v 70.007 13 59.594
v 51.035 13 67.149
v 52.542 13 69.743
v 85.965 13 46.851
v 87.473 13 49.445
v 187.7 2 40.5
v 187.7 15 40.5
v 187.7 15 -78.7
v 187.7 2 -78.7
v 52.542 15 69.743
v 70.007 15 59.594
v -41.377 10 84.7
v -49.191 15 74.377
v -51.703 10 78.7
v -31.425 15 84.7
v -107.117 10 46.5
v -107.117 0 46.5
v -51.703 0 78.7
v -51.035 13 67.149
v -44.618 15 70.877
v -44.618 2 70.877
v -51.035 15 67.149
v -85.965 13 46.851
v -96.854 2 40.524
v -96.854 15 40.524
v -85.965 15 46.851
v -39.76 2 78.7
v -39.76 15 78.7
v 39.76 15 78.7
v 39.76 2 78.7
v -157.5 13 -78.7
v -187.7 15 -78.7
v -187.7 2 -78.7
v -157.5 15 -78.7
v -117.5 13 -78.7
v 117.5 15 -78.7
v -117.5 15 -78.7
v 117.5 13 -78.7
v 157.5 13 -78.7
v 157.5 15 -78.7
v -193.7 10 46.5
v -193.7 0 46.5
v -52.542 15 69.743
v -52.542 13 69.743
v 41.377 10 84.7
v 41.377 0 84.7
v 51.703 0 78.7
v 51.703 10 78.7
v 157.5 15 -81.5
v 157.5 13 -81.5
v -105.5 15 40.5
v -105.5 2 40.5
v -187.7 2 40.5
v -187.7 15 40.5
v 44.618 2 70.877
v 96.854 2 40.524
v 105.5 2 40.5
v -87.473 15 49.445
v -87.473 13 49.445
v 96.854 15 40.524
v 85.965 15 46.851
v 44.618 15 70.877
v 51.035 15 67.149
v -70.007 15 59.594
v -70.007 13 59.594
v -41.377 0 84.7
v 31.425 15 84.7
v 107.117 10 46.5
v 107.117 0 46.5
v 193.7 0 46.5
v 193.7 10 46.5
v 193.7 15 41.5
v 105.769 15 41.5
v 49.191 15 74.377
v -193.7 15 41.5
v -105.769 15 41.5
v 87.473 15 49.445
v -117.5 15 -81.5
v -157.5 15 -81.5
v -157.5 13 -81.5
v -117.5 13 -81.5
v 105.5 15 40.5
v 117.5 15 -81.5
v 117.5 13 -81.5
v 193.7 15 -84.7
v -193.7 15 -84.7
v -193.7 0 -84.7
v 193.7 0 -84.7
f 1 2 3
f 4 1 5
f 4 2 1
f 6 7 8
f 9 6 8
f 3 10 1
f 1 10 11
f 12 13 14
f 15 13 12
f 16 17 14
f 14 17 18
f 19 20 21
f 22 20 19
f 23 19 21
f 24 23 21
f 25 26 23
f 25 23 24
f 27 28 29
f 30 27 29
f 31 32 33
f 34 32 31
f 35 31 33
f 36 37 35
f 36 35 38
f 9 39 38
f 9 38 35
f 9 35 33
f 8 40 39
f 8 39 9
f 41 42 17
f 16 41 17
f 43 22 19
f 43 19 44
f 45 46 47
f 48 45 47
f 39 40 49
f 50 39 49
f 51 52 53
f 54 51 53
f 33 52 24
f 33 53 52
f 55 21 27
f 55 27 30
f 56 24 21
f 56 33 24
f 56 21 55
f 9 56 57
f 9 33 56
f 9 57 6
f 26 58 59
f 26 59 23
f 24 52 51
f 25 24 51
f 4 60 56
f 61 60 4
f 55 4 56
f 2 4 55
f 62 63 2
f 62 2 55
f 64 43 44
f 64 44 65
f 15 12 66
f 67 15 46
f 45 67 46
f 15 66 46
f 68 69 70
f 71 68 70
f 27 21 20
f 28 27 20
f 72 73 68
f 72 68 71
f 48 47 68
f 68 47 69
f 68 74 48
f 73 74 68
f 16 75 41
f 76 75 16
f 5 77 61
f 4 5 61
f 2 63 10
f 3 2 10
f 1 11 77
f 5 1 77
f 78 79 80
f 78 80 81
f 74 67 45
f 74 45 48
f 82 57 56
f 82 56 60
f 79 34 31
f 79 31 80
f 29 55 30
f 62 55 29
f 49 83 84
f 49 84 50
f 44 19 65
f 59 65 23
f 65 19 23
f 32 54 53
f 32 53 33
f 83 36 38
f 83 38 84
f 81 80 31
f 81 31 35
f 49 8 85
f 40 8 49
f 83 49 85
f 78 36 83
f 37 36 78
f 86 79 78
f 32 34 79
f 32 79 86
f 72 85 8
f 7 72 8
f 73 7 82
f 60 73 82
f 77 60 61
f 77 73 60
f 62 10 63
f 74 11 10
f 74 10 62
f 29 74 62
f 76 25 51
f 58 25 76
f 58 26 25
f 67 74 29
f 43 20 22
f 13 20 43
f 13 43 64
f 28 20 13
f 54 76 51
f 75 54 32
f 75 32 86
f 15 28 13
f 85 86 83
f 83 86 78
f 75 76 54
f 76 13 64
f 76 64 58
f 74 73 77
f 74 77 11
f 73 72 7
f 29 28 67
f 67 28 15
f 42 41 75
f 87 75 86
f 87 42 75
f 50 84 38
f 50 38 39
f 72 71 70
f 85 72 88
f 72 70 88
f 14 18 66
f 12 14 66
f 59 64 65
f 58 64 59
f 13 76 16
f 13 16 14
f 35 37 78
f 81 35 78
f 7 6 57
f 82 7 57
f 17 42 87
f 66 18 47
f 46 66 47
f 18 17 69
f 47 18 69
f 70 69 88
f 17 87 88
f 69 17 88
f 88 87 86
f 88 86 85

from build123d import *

# Parameters (mm, degrees)
SKETCH1_W           = 387.4
SKETCH1_H           = 169.4
BOSS_EXTRUDE1_DEPTH = 15
SKETCH2_W           = 375.4
SKETCH2_H           = 157.4
CUT_EXTRUDE1_DEPTH  = 13
SKETCH3_W           = 40
SKETCH3_H           = 2.8
CUT_EXTRUDE2_DEPTH  = 2
BOSS_EXTRUDE2_DEPTH = 13
CUT_EXTRUDE3_DEPTH  = 212.940510521
CHAMFER1_SIZE       = 5
SKETCH7_W           = 76.032406234
SKETCH7_H           = 13
BOSS_EXTRUDE3_DEPTH = 4.323125
CHAMFER3_SIZE2      = 8.130615601
CHAMFER3_SIZE       = 4.323125
CHAMFER4_SIZE2      = 4.323125
CHAMFER4_SIZE       = 7.487872147
SKETCH8_W           = 76.032406234
SKETCH8_H           = 13
BOSS_EXTRUDE4_DEPTH = 4.323125
CHAMFER5_SIZE2      = 8.130615601
CHAMFER5_SIZE       = 4.323125
CHAMFER6_SIZE2      = 4.323125
CHAMFER6_SIZE       = 7.487872147
CUT_EXTRUDE4_DEPTH  = 2


with BuildPart() as part:
    # Sketch1 → Boss-Extrude1 (new body)
    with BuildSketch(Plane(origin=(0, 0, 0), x_dir=(1, 0, 0), z_dir=(0, 1, 0))):
        Rectangle(SKETCH1_W, SKETCH1_H)
    extrude(amount=BOSS_EXTRUDE1_DEPTH)

    # Sketch2 → Cut-Extrude1 (cut)
    with BuildSketch(Plane(origin=(0, 15, 0), x_dir=(1, 0, 0), z_dir=(0, 1, 0))):
        Rectangle(SKETCH2_W, SKETCH2_H)
    extrude(amount=-CUT_EXTRUDE1_DEPTH, mode=Mode.SUBTRACT)

    # Sketch3 → Cut-Extrude2 (cut)
    with BuildSketch(Plane(origin=(0, 15, 0), x_dir=(1, 0, 0), z_dir=(0, 1, 0))):
        with Locations((137.5, 80.1)):
            Rectangle(SKETCH3_W, SKETCH3_H)
        with Locations((-137.5, 80.1)):
            Rectangle(SKETCH3_W, SKETCH3_H)
    extrude(amount=-CUT_EXTRUDE2_DEPTH, mode=Mode.SUBTRACT)

    # Sketch4 → Boss-Extrude2 (add)
    with BuildSketch(Plane(origin=(0, 2, 0), x_dir=(1, 0, 0), z_dir=(0, 1, 0))):
        Polygon((187.7, -40.5), (105.5, -40.5), (39.760462446, -78.7), (51.702725205, -78.7), (107.116680945, -46.5), (187.7, -46.5), align=None)
        Polygon((-187.7, -46.5), (-107.116680945, -46.5), (-51.702725205, -78.7), (-39.760462446, -78.7), (-105.5, -40.5), (-187.7, -40.5), align=None)
    extrude(amount=BOSS_EXTRUDE2_DEPTH)

    # Sketch5 → Cut-Extrude3 (cut, through all)
    with BuildSketch(Plane.XZ):
        Polygon((107.116680945, 46.5), (193.7, 46.5), (193.7, 84.7), (41.377143391, 84.7), (51.702725205, 78.7), align=None)
        Polygon((-193.7, 84.7), (-193.7, 46.5), (-107.116680945, 46.5), (-51.702725205, 78.7), (-41.377143391, 84.7), align=None)
    extrude(amount=-CUT_EXTRUDE3_DEPTH, mode=Mode.SUBTRACT)

    # Chamfer1
    chamfer1_edges = [part.edges().sort_by_distance(p)[0] for p in [
        (150.408340472, 15, 46.5),
        (74.246912168, 15, 65.6),
        (-150.408340472, 15, 46.5),
        (-74.246912168, 15, 65.6),
    ]]
    chamfer(chamfer1_edges, length=CHAMFER1_SIZE)

    # Sketch7 → Boss-Extrude3 (add)
    with BuildSketch(Plane(origin=(-44.223957073, 0, 76.106347822), x_dir=(-0.8646252408638723, 0, -0.5024173492835322), z_dir=(0.5024173492835322, 0, -0.8646252408638723))):
        with Locations((32.853857148, 8.5)):
            Rectangle(SKETCH7_W, SKETCH7_H)
    extrude(amount=BOSS_EXTRUDE3_DEPTH)

    # Chamfer3
    chamfer3_edges = [part.edges().sort_by_distance(p)[0] for p in [
        (-37.588449443, 8.5, 74.962117006),
    ]]
    chamfer3_side = [part.faces().sort_by_distance(p)[0] for p in [
        (-37.631889703, 8.5, 75.036874665),
    ]]
    chamfer(chamfer3_edges, length=CHAMFER3_SIZE - 0.0001, length2=CHAMFER3_SIZE2 - 0.0001, reference=chamfer3_side[0])  # a hair under: the kernel refuses the full size

    # Chamfer4
    chamfer4_edges = [part.edges().sort_by_distance(p)[0] for p in [
        (-103.327986997, 8.5, 36.762117006),
    ]]
    chamfer4_side = [part.faces().sort_by_distance(p)[0] for p in [
        (-103.253229337, 8.5, 36.805557266),
    ]]
    chamfer(chamfer4_edges, length=CHAMFER4_SIZE - 0.0001, length2=CHAMFER4_SIZE2 - 0.0001, reference=chamfer4_side[0])  # a hair under: the kernel refuses the full size

    # Sketch8 → Boss-Extrude4 (add)
    with BuildSketch(Plane(origin=(44.223957073, 0, 76.106347822), x_dir=(-0.8646252408638638, 0, 0.5024173492835469), z_dir=(-0.5024173492835469, 0, -0.8646252408638639))):
        with Locations((-32.853857148, 8.5)):
            Rectangle(SKETCH8_W, SKETCH8_H)
    extrude(amount=BOSS_EXTRUDE4_DEPTH)

    # Chamfer5
    chamfer5_edges = [part.edges().sort_by_distance(p)[0] for p in [
        (37.588449443, 8.5, 74.962117006),
    ]]
    chamfer5_side = [part.faces().sort_by_distance(p)[0] for p in [
        (37.631889703, 8.5, 75.036874665),
    ]]
    chamfer(chamfer5_edges, length=CHAMFER5_SIZE - 0.0001, length2=CHAMFER5_SIZE2 - 0.0001, reference=chamfer5_side[0])  # a hair under: the kernel refuses the full size

    # Chamfer6
    chamfer6_edges = [part.edges().sort_by_distance(p)[0] for p in [
        (103.327986997, 8.5, 36.762117006),
    ]]
    chamfer6_side = [part.faces().sort_by_distance(p)[0] for p in [
        (103.253229337, 8.5, 36.805557266),
    ]]
    chamfer(chamfer6_edges, length=CHAMFER6_SIZE - 0.0001, length2=CHAMFER6_SIZE2 - 0.0001, reference=chamfer6_side[0])  # a hair under: the kernel refuses the full size

    # Sketch9 → Cut-Extrude4 (cut)
    with BuildSketch(Plane(origin=(0, 15, 0), x_dir=(1, 0, 0), z_dir=(0, 1, 0))):
        Polygon((70.007252271, -59.593876001), (87.472682136, -49.445045546), (85.965430137, -46.851169906), (51.034570406, -67.148830817), (52.541822405, -69.742706457), align=None)
        Polygon((-70.007251916, -59.593875391), (-87.472681782, -49.445044935), (-85.965430137, -46.851169906), (-51.034570406, -67.148830817), (-52.541822051, -69.742705846), align=None)
    extrude(amount=-CUT_EXTRUDE4_DEPTH, mode=Mode.SUBTRACT)


solid = part.part
